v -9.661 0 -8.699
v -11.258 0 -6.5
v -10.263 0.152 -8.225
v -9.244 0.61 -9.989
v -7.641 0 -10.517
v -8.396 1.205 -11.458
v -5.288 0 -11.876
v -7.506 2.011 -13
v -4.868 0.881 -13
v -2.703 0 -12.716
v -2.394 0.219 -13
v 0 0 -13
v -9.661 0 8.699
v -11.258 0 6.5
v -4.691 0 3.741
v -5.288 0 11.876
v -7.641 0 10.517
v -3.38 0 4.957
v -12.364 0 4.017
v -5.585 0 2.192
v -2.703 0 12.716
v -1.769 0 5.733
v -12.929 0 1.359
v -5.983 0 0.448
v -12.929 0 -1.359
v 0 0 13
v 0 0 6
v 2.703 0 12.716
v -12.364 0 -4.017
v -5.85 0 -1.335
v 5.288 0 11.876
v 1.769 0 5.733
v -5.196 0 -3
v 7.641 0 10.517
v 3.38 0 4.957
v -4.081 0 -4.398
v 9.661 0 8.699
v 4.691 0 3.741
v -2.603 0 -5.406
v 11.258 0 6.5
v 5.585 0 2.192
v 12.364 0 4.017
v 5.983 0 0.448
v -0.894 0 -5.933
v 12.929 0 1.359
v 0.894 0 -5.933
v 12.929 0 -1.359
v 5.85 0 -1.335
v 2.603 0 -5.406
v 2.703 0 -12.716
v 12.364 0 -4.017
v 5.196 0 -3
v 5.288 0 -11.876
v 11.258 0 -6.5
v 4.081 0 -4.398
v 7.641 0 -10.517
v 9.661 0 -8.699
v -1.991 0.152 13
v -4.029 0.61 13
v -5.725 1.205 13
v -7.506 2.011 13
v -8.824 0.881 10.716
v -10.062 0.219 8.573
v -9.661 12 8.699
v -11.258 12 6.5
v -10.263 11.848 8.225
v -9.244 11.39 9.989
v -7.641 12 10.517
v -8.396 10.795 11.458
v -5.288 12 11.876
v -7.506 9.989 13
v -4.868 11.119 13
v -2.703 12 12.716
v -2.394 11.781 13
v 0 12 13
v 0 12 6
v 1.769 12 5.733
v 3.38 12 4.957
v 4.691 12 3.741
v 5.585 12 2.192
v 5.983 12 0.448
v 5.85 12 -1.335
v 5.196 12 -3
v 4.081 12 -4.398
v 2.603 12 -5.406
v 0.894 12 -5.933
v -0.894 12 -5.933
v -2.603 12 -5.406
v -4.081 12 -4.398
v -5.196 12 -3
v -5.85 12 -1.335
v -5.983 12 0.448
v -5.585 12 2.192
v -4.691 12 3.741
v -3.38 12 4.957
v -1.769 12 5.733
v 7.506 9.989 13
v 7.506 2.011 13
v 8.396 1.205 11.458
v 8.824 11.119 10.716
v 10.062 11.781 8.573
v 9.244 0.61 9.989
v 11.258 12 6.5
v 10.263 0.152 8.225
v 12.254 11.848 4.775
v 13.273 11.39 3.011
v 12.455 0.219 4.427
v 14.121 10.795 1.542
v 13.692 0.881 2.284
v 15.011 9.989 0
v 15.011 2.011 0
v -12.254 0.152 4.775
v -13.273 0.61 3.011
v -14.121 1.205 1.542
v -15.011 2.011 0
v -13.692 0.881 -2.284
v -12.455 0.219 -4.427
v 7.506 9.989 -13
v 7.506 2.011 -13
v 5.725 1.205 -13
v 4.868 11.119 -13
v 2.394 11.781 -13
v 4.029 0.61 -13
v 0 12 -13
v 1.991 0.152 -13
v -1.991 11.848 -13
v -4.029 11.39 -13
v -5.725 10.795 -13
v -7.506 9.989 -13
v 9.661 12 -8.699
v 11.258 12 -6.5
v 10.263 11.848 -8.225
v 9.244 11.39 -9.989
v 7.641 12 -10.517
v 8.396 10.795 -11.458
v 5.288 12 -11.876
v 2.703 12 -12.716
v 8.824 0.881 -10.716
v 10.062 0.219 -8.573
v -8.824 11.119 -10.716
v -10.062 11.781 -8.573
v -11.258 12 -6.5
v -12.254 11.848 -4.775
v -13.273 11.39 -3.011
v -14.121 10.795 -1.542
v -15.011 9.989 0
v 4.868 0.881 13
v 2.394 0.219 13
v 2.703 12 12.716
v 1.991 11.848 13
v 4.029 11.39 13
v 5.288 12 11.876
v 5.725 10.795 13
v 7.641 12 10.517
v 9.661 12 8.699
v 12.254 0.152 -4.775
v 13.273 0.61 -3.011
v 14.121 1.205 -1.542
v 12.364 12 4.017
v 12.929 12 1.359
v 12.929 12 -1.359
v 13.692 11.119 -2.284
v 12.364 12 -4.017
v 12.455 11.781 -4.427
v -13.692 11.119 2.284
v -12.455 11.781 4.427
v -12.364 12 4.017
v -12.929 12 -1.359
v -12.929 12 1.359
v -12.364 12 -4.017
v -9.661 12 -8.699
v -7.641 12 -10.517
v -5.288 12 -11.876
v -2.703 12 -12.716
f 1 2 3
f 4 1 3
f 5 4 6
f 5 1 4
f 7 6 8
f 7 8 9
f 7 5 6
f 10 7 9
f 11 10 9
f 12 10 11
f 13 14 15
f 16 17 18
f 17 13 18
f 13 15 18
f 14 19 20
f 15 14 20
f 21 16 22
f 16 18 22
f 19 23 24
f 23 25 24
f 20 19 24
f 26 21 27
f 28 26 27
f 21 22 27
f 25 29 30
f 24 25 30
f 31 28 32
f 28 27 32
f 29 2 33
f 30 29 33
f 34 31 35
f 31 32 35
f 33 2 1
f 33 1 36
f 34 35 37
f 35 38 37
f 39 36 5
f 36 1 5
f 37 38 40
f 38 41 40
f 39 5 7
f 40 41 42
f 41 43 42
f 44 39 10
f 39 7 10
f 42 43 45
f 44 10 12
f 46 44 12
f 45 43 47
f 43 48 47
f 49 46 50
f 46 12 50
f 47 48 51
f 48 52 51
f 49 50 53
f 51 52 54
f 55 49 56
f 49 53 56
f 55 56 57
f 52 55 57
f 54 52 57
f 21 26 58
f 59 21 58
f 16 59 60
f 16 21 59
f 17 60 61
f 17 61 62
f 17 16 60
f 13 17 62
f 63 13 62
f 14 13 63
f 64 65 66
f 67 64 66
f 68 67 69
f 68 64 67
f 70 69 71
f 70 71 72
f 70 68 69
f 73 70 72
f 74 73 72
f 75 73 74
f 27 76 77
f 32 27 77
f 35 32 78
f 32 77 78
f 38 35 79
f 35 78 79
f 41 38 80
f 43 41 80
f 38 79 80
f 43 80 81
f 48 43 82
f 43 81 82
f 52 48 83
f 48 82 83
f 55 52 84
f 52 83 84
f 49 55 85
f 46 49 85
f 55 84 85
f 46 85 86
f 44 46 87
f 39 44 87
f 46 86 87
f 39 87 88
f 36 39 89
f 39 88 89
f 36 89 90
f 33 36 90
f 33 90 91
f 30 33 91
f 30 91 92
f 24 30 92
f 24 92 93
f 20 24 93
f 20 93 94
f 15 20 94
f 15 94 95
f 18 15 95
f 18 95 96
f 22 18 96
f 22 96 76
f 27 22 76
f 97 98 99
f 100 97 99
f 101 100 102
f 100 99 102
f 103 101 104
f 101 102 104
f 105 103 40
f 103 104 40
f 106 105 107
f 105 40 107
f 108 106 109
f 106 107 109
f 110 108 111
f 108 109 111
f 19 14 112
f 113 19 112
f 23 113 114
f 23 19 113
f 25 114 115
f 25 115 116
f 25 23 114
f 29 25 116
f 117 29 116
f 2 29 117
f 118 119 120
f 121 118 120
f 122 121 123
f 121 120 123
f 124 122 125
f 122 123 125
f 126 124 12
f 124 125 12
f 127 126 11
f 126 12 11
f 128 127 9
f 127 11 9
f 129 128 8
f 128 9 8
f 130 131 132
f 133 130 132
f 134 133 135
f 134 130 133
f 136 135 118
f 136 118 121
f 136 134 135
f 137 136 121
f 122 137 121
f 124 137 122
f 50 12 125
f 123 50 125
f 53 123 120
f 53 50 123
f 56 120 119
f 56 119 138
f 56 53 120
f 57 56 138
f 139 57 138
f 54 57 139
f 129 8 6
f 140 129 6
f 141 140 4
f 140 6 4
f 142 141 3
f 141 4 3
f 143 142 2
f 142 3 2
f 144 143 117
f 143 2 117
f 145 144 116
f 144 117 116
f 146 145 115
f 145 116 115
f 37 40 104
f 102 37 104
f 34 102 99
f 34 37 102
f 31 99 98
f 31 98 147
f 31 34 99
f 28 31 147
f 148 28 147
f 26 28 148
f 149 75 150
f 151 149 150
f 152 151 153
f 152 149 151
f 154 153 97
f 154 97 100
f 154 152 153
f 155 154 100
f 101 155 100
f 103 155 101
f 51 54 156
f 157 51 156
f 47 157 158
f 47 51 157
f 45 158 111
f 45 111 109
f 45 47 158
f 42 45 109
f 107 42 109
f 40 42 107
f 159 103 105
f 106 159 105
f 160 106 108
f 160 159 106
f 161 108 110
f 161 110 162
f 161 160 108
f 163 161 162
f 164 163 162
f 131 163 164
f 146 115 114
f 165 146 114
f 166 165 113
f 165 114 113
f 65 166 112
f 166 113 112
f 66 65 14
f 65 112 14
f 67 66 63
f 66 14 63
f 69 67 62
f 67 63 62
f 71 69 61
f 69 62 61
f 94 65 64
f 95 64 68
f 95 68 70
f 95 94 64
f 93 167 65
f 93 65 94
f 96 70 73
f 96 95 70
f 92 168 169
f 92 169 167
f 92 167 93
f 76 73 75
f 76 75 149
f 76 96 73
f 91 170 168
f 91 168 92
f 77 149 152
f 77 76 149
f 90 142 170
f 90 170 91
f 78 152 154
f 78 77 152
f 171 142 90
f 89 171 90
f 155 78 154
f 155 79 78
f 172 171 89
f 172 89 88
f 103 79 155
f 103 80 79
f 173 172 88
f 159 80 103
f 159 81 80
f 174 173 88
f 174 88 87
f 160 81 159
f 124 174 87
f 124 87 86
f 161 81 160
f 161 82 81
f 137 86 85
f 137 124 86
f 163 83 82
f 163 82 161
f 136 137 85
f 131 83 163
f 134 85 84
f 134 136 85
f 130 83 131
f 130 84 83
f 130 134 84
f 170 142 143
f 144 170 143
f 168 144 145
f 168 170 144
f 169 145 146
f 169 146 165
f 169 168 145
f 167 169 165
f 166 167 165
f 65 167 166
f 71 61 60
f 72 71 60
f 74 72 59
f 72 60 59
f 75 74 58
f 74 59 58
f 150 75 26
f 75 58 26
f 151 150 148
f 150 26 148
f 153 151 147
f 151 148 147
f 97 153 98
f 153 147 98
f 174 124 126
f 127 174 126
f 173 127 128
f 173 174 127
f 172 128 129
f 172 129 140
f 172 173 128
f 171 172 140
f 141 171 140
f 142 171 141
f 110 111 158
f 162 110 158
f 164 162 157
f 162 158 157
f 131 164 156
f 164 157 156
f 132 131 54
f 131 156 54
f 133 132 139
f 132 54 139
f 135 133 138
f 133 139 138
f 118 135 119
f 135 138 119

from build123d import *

# Parameters (mm, degrees)
BOSS_EXTRUDE1_DEPTH = 12
SKETCH3_R           = 6
CUT_EXTRUDE1_DEPTH  = 24.202011407
SKETCH6_OUTSIDE_W   = 88.724
SKETCH6_OUTSIDE_H   = 84.702
SKETCH6_OUTSIDE_R   = 13
CUT_EXTRUDE3_DEPTH  = 24.202011407
CUT_EXTRUDE3_DRAFT  = -45
SKETCH7_OUTSIDE_W   = 88.724
SKETCH7_OUTSIDE_H   = 84.702
SKETCH7_OUTSIDE_R   = 13
CUT_EXTRUDE4_DEPTH  = 24.202011407
CUT_EXTRUDE4_DRAFT  = -45


with BuildPart() as part:
    # Sketch2 → Boss-Extrude1 (new body)
    with BuildSketch(Plane(origin=(0, 0, 0), x_dir=(1, 0, 0), z_dir=(0, 1, 0))):
        Polygon((-15.011106999, 0), (-7.505553499, -13), (7.505553499, -13), (15.011106999, 0), (7.505553499, 13), (-7.505553499, 13), align=None)
    extrude(amount=BOSS_EXTRUDE1_DEPTH)

    # Sketch3 → Cut-Extrude1 (cut, through all)
    with BuildSketch(Plane(origin=(0, 12, 0), x_dir=(1, 0, 0), z_dir=(0, 1, 0))):
        with Locations(Location((0, 0, 0), (0, 0, 270))):
            Circle(SKETCH3_R)
    extrude(amount=-CUT_EXTRUDE1_DEPTH, mode=Mode.SUBTRACT)


with BuildPart() as cut_extrude3_tool:
    # Sketch6 outside → Cut-Extrude3 (with draft: the straight prism first)
    with BuildSketch(Plane(origin=(0, 12, 0), x_dir=(1, 0, 0), z_dir=(0, 1, 0))):
        Rectangle(SKETCH6_OUTSIDE_W, SKETCH6_OUTSIDE_H)
        Circle(SKETCH6_OUTSIDE_R, mode=Mode.SUBTRACT)
    extrude(amount=-CUT_EXTRUDE3_DEPTH)
    # Cut-Extrude3: the draft: its side faces are tilted about the plane it starts from
    cut_extrude3_sides = [cut_extrude3_tool.faces().sort_by_distance(p)[0] for p in [
        (0, -0.101005704, 42.351),
        (44.362, -0.101005704, 0),
        (0, -0.101005704, -42.351),
        (-44.362, -0.101005704, 0),
        (-13, -0.101005704, 0),
    ]]
    draft(cut_extrude3_sides, Plane(origin=(0, 12, 0), x_dir=(1, 0, 0), z_dir=(0, 1, 0)), CUT_EXTRUDE3_DRAFT)


with BuildPart() as part_1:
    add(part.part)

    # Cut-Extrude3: cut by cut_extrude3_tool
    add(cut_extrude3_tool.part, mode=Mode.SUBTRACT)


with BuildPart() as cut_extrude4_tool:
    # Sketch7 outside → Cut-Extrude4 (with draft: the straight prism first)
    with BuildSketch(Plane.XZ):
        Rectangle(SKETCH7_OUTSIDE_W, SKETCH7_OUTSIDE_H)
        Circle(SKETCH7_OUTSIDE_R, mode=Mode.SUBTRACT)
    extrude(amount=-CUT_EXTRUDE4_DEPTH)
    # Cut-Extrude4: the draft: its side faces are tilted about the plane it starts from
    cut_extrude4_sides = [cut_extrude4_tool.faces().sort_by_distance(p)[0] for p in [
        (0, 12.101005704, -42.351),
        (44.362, 12.101005704, 0),
        (0, 12.101005704, 42.351),
        (-44.362, 12.101005704, 0),
        (-13, 12.101005704, 0),
    ]]
    draft(cut_extrude4_sides, Plane.XZ, CUT_EXTRUDE4_DRAFT)


with BuildPart() as part_2:
    add(part_1.part)

    # Cut-Extrude4: cut by cut_extrude4_tool
    add(cut_extrude4_tool.part, mode=Mode.SUBTRACT)


solid = part_2.part
